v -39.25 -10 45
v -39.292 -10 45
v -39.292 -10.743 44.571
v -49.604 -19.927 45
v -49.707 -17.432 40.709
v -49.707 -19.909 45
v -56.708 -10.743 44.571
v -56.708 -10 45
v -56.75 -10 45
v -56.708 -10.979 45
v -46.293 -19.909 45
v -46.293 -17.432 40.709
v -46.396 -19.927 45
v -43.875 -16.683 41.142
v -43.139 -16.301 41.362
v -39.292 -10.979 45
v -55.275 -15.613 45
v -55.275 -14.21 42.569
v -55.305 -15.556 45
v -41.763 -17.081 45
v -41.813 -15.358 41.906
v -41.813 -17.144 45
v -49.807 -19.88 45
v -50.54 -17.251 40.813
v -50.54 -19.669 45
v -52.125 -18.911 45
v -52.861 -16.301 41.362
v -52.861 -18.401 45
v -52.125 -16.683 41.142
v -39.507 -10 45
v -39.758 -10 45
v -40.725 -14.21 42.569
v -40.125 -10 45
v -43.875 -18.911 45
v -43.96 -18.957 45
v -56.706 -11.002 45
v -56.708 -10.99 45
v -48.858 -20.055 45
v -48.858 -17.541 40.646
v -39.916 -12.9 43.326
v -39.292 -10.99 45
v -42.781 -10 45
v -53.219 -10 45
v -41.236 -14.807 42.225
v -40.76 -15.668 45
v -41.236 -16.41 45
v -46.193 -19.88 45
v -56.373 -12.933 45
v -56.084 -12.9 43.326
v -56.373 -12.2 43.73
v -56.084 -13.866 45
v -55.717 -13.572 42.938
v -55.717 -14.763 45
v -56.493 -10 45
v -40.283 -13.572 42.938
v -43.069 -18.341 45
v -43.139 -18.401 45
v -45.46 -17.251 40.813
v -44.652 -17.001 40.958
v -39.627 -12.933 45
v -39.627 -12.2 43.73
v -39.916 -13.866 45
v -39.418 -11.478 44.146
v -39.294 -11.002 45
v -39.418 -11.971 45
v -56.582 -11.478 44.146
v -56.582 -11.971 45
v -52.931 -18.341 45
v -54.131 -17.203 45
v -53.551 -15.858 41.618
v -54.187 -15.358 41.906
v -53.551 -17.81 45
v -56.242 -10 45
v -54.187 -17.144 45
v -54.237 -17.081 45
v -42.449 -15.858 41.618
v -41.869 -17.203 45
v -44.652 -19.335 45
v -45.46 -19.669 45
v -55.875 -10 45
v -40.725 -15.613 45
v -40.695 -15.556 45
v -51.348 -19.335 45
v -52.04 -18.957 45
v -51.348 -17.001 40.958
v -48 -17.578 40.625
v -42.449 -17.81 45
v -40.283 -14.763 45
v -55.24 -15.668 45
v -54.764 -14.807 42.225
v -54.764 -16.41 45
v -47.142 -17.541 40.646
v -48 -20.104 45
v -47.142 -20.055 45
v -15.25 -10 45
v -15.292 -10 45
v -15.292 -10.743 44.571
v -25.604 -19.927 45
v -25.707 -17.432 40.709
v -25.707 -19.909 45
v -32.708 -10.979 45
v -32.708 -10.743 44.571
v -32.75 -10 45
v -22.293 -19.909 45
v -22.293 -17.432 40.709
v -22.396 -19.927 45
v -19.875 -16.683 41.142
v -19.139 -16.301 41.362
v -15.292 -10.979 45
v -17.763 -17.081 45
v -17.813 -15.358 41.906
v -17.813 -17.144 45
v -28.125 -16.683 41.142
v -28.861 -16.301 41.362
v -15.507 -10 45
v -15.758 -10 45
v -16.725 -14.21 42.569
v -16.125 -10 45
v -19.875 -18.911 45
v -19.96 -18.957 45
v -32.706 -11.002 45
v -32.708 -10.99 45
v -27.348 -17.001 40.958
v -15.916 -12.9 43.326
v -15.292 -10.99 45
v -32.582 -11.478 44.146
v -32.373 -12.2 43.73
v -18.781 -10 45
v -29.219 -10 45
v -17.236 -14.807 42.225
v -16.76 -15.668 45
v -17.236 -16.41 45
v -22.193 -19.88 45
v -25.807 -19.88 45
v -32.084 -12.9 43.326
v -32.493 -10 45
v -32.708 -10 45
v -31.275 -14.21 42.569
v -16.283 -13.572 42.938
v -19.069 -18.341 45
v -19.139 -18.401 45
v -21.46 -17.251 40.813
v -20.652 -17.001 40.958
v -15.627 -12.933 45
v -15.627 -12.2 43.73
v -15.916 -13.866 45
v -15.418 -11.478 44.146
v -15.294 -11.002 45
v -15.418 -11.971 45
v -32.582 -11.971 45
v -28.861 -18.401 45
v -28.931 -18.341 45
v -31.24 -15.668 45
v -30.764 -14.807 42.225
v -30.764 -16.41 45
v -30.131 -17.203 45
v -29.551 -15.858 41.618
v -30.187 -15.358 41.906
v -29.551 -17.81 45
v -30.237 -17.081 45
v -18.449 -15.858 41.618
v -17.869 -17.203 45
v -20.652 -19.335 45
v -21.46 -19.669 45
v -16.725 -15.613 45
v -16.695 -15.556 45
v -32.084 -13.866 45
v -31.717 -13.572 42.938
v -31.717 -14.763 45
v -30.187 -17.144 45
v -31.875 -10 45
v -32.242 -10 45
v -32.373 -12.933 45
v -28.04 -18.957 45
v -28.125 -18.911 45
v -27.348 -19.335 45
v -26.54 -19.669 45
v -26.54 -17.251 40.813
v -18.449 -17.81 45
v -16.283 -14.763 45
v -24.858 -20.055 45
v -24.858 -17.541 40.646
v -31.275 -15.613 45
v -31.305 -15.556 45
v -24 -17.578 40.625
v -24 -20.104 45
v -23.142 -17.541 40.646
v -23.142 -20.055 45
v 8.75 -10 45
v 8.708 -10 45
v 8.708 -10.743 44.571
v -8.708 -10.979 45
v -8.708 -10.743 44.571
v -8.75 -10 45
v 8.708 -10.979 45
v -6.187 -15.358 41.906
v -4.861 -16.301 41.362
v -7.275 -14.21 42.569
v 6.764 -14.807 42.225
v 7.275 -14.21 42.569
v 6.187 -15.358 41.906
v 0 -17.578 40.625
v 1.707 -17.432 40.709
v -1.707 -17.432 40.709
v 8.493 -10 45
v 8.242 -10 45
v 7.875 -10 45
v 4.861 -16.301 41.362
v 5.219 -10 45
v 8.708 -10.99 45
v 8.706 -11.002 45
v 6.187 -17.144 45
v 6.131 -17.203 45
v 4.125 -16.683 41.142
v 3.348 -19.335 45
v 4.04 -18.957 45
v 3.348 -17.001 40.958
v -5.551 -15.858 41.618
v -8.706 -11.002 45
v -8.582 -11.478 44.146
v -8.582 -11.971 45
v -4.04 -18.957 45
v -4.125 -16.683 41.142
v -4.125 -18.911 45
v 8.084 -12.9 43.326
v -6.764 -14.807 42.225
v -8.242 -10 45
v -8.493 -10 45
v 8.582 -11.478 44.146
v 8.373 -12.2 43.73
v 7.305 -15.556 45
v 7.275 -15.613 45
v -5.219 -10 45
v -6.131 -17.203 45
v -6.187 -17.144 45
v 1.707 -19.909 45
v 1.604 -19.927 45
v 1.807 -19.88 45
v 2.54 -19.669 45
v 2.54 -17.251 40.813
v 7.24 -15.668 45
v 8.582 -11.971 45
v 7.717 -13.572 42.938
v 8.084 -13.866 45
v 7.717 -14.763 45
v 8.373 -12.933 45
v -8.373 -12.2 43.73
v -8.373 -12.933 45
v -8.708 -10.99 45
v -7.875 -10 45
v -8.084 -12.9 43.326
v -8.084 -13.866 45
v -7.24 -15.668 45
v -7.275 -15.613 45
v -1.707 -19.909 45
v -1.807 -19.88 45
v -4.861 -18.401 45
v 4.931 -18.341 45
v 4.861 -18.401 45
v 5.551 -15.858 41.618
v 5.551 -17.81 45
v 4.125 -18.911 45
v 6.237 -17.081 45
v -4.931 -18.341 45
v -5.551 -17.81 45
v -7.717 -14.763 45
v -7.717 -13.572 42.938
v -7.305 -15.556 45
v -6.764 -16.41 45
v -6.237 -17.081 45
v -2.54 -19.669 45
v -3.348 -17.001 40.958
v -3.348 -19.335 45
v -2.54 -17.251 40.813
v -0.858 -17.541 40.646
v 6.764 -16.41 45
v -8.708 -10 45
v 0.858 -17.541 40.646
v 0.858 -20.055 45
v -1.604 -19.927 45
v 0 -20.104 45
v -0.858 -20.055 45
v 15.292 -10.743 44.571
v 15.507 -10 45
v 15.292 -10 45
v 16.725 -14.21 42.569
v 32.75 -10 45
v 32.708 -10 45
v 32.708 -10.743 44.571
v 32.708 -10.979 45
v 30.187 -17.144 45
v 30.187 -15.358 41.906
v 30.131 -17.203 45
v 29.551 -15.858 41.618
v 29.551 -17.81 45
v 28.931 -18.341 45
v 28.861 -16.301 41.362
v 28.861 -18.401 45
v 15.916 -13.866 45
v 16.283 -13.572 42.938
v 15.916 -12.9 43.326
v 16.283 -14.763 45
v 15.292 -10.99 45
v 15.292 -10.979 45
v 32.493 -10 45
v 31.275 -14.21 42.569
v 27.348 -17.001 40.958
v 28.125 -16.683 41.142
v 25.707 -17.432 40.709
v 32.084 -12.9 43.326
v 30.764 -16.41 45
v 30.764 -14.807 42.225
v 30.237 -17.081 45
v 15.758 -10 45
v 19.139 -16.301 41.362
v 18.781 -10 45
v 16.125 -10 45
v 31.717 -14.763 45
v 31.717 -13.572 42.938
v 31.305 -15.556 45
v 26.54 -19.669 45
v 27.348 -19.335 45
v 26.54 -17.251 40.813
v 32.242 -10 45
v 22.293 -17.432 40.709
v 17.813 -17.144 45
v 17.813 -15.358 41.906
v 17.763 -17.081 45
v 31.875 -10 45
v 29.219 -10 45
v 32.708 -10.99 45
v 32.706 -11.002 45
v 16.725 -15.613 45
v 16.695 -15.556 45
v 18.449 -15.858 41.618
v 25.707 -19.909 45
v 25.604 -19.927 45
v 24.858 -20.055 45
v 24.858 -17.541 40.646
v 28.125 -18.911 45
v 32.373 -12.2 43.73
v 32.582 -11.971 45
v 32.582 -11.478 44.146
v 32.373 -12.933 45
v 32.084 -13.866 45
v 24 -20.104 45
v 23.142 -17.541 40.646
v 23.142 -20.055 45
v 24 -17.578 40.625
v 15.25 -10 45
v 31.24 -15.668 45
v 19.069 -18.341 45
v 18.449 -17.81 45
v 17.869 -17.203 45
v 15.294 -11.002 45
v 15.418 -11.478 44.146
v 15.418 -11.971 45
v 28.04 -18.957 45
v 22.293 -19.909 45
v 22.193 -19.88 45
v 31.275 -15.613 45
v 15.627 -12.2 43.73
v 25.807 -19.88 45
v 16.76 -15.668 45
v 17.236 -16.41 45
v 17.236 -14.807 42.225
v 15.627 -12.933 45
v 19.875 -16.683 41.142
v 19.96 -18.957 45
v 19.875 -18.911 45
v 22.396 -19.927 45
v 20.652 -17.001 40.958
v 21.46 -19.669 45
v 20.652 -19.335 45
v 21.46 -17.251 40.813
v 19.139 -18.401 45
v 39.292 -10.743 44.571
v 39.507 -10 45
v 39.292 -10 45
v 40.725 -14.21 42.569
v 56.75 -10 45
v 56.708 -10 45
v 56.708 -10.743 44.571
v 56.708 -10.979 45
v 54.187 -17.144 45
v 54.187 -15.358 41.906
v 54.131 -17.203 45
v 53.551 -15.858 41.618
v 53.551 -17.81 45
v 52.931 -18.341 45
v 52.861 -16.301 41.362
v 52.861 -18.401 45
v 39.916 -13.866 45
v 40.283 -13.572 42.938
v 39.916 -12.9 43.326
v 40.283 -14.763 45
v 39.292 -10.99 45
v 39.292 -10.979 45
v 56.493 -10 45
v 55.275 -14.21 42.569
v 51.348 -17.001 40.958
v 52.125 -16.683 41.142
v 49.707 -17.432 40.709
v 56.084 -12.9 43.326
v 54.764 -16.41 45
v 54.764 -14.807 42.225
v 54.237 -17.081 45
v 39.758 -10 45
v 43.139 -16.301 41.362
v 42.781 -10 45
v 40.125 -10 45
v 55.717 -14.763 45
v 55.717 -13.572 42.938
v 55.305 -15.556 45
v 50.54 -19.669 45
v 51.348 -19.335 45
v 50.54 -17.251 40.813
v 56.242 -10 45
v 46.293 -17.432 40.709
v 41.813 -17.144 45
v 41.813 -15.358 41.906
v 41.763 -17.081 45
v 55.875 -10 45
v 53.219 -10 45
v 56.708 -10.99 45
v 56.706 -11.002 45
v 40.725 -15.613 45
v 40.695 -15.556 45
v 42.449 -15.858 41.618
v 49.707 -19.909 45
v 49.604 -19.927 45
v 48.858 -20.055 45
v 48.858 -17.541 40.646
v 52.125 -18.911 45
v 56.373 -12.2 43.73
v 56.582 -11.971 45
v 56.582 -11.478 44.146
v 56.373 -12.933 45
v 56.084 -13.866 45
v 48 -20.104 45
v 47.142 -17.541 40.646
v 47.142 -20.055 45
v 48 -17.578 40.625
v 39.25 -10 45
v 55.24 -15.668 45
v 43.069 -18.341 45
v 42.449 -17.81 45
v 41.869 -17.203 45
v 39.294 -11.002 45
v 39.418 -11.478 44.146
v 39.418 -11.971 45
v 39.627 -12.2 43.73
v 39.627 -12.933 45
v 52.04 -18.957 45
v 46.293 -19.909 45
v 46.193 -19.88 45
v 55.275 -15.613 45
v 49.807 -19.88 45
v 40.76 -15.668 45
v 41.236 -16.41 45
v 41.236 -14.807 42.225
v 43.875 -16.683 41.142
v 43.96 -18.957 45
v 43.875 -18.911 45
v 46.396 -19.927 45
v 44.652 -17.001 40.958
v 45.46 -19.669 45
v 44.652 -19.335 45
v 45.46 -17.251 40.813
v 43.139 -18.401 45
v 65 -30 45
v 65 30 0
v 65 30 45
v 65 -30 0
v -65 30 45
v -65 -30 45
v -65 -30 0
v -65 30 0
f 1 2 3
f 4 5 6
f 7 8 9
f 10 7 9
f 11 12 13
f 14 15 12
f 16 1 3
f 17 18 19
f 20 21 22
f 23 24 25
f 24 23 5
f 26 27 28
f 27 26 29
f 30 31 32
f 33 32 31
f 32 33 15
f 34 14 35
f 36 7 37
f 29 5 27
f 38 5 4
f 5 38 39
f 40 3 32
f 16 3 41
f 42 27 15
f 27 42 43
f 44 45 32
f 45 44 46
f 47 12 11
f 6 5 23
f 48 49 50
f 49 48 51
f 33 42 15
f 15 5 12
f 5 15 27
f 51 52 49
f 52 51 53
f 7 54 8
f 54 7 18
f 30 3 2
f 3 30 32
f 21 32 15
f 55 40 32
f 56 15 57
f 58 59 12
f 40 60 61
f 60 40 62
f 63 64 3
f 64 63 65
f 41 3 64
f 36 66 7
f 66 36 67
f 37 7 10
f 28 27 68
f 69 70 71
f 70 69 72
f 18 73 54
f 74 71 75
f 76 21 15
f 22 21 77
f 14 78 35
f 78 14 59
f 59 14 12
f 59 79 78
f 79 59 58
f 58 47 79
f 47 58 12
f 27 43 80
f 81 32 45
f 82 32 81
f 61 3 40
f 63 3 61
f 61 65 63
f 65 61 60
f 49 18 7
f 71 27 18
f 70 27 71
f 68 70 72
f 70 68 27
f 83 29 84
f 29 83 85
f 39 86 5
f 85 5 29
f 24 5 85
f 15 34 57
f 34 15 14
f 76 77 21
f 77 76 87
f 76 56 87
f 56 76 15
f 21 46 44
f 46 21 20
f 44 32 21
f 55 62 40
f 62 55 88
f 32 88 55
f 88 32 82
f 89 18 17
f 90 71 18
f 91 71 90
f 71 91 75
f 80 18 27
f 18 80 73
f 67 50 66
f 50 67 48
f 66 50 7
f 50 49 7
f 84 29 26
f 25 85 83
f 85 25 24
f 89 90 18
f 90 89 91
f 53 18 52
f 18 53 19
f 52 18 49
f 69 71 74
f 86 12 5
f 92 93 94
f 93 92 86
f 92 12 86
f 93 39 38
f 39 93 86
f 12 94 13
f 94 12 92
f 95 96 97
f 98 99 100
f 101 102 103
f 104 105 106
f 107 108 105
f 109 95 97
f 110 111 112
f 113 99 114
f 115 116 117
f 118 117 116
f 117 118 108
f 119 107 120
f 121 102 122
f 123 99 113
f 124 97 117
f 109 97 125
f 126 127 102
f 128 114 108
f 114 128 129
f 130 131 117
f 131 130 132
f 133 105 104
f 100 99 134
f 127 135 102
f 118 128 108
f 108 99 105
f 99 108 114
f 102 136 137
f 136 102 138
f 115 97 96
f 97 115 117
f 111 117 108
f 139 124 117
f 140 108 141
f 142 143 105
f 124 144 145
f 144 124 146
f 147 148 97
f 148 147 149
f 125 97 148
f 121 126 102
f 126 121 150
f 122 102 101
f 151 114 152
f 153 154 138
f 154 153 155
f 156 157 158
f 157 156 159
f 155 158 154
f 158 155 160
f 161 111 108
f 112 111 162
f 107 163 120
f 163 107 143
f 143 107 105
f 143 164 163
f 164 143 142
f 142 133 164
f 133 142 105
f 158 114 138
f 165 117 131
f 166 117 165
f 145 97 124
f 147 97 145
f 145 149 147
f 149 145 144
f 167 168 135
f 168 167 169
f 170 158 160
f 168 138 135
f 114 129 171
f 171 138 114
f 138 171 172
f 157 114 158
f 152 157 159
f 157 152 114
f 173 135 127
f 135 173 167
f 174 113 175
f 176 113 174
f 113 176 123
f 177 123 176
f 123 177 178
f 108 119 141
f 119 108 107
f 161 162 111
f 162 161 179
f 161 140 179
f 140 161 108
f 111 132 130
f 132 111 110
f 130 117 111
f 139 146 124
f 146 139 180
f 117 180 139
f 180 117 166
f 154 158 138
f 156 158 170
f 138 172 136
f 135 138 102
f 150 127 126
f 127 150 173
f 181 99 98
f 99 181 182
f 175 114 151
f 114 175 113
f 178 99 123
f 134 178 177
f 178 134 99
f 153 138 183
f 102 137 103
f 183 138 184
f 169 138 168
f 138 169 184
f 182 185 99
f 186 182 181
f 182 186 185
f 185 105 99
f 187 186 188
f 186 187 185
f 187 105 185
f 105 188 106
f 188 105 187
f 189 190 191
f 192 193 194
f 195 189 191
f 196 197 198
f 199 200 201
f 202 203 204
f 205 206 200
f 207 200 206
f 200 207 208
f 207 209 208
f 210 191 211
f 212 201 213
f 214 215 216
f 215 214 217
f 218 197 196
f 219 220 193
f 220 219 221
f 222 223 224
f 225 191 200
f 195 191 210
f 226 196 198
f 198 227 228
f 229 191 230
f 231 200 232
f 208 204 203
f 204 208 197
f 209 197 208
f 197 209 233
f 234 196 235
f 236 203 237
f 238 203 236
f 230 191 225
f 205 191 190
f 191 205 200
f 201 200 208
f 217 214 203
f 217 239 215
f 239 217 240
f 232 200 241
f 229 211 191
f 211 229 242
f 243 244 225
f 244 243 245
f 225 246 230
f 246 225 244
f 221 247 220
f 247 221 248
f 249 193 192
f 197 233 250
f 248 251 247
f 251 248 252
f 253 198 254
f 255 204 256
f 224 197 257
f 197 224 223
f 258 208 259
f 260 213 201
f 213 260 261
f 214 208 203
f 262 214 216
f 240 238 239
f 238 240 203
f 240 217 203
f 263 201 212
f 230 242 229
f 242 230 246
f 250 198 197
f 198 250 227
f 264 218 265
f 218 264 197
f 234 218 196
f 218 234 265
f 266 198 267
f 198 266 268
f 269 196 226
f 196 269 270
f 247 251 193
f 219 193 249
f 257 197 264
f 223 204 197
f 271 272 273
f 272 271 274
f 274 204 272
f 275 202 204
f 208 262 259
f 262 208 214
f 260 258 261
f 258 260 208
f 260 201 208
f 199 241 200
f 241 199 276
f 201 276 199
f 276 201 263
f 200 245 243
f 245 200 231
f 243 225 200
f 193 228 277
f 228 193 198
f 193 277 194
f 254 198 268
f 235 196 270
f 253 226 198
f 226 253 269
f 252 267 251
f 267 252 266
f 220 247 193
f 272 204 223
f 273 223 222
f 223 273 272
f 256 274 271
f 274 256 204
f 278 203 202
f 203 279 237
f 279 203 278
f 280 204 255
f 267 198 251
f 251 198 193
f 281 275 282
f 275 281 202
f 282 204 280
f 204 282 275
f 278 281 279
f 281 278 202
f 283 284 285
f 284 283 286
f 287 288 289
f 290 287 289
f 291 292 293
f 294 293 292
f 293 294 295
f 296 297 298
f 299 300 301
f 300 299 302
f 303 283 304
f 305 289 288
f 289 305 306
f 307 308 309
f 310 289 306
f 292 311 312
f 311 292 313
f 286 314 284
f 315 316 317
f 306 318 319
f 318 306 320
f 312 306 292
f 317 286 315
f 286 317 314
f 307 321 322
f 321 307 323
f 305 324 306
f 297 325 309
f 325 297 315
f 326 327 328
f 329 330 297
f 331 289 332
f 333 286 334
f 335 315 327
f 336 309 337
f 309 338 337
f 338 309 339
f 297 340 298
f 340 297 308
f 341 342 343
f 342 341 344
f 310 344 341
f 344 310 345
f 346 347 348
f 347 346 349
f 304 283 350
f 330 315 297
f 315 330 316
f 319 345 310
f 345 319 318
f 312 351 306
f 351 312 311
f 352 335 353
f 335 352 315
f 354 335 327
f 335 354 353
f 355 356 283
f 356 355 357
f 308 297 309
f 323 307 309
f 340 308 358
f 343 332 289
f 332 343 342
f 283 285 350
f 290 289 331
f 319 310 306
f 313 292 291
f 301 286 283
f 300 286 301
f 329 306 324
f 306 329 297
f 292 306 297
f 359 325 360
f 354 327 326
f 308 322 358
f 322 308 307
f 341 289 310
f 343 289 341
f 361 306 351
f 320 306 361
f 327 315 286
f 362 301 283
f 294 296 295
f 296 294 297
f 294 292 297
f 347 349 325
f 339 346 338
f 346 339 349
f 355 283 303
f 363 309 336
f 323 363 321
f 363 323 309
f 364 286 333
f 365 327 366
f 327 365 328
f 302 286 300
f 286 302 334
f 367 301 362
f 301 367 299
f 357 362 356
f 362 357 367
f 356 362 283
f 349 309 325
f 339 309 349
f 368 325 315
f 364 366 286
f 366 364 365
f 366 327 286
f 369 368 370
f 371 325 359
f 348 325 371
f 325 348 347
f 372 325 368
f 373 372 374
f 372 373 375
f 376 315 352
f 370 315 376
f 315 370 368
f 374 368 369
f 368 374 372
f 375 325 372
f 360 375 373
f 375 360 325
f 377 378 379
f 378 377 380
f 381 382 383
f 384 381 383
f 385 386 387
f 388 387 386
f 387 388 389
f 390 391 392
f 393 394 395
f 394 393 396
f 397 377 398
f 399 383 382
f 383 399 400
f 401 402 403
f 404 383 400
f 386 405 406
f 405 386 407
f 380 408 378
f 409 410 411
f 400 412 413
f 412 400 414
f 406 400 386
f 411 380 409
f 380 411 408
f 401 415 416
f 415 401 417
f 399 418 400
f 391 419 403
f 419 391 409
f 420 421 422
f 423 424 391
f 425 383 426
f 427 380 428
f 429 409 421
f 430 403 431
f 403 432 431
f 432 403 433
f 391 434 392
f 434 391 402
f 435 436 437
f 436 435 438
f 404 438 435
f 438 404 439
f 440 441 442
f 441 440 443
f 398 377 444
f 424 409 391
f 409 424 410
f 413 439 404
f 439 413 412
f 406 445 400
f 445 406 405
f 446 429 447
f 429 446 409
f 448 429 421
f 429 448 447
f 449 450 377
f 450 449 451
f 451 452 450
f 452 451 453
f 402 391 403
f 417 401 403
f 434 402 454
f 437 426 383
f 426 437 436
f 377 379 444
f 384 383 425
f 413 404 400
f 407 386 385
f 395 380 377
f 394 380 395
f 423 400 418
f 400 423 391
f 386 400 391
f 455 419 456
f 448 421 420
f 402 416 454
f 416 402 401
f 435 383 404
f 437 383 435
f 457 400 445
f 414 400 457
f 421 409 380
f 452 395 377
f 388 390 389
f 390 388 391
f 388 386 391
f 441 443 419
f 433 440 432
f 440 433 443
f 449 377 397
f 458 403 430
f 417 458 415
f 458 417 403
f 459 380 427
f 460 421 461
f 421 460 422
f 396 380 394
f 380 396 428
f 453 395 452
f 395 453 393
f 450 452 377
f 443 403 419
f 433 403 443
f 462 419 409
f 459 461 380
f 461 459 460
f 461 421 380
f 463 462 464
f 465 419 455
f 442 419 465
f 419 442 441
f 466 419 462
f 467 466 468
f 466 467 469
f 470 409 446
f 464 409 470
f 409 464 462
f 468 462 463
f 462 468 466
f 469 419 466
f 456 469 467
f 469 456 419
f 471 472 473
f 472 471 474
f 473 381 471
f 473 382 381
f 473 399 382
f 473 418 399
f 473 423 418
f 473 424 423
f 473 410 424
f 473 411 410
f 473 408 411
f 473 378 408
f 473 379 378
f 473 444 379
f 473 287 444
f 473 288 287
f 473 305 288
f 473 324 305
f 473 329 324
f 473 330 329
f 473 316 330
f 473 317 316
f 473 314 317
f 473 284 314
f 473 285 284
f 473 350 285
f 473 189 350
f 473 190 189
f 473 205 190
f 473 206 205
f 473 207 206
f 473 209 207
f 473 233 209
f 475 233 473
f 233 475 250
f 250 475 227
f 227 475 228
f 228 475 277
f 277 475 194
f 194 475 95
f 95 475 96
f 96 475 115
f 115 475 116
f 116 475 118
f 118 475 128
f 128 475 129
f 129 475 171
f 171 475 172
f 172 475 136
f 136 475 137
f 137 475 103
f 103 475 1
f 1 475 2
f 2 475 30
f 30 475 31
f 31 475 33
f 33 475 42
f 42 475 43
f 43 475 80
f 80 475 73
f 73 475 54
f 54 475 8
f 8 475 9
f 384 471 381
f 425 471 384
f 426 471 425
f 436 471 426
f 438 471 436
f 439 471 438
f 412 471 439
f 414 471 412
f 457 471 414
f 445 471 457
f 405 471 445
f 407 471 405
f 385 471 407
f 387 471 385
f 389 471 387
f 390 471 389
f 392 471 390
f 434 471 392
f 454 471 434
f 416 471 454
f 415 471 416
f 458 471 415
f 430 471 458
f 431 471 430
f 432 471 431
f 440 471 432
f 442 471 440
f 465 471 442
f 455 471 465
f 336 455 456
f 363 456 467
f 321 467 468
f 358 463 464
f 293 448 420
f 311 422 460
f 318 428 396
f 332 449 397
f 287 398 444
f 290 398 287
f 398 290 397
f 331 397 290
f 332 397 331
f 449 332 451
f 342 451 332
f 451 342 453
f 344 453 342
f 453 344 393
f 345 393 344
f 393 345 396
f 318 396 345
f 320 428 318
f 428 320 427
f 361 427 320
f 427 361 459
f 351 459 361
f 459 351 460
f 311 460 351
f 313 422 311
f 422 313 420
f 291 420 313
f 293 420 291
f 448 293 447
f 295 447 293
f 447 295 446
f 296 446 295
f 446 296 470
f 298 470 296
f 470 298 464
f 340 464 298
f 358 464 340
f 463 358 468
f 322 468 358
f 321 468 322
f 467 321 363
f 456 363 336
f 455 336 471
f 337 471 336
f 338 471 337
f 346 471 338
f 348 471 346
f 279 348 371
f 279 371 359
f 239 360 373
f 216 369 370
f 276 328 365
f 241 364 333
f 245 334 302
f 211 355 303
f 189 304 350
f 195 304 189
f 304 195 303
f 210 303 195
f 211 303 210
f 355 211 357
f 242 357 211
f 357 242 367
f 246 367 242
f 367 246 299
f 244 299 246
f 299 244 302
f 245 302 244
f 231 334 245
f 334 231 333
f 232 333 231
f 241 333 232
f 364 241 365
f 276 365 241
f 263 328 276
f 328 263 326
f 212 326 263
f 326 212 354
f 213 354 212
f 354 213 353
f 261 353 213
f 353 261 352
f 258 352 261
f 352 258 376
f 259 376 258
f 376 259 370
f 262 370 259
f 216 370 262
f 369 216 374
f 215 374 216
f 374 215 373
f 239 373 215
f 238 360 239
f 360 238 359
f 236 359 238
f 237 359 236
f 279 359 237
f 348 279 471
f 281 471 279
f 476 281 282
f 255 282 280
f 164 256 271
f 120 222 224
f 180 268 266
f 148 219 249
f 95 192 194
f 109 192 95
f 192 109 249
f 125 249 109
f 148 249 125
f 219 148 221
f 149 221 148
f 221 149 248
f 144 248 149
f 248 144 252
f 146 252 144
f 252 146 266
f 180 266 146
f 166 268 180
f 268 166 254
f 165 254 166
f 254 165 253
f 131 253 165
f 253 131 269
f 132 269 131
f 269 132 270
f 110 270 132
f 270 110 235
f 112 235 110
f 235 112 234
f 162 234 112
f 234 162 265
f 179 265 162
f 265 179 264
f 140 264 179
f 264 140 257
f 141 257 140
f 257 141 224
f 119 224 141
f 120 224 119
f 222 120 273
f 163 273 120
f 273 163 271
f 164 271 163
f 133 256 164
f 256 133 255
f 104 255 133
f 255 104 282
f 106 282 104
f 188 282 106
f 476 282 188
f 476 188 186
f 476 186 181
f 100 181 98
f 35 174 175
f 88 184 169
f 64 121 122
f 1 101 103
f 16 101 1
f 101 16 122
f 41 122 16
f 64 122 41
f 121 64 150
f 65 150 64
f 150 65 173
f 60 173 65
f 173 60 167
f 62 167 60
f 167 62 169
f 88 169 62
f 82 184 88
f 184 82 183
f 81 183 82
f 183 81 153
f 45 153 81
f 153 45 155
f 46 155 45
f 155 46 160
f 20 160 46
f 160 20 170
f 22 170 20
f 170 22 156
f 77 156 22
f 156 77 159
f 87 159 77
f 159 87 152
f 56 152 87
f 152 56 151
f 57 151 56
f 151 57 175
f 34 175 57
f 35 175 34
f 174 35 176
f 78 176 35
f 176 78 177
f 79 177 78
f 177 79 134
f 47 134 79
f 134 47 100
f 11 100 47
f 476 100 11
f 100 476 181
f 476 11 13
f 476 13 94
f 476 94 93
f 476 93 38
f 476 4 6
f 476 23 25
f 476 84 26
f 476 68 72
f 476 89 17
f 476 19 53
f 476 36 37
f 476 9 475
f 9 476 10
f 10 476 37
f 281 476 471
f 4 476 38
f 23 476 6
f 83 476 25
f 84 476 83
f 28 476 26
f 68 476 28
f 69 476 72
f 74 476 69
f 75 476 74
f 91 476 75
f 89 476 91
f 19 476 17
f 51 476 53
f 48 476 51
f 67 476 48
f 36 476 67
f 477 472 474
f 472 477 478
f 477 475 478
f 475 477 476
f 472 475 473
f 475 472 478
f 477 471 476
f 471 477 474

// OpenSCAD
// Dimensions (mm)
block_length = 130;   // X
block_depth  = 60;    // Y
block_height = 45;    // Z

hole_diameter = 17.5;
hole_radius   = hole_diameter / 2;
hole_depth    = 40;   // along axis
hole_spacing  = 24;
num_holes     = 5;

tilt_angle = 30;      // degrees from vertical in YZ plane

// Derived positions
top_y = -10;          // Y position where axis meets top face
start_x = -(num_holes - 1) * hole_spacing / 2;

$fn = 64;

// Main block, centred on origin
difference() {
    translate([-block_length/2, -block_depth/2, 0])
        cube([block_length, block_depth, block_height]);

    // Five tilted blind holes
    for (i = [0 : num_holes - 1]) {
        x_pos = start_x + i * hole_spacing;
        
        // Translate to the point on the top face where the hole axis starts
        translate([x_pos, top_y, block_height])
        // Rotate so the cylinder axis tilts 30 deg toward +Y
        rotate([tilt_angle, 0, 0])
        // Cylinder extends downward along its local Z axis
        // Add 1 mm extra depth to ensure it cuts fully through the block if needed
        // and to satisfy the "extend past faces" rule for the bottom of the hole
        cylinder(r = hole_radius, h = hole_depth + 1, center = false);
    }
}
